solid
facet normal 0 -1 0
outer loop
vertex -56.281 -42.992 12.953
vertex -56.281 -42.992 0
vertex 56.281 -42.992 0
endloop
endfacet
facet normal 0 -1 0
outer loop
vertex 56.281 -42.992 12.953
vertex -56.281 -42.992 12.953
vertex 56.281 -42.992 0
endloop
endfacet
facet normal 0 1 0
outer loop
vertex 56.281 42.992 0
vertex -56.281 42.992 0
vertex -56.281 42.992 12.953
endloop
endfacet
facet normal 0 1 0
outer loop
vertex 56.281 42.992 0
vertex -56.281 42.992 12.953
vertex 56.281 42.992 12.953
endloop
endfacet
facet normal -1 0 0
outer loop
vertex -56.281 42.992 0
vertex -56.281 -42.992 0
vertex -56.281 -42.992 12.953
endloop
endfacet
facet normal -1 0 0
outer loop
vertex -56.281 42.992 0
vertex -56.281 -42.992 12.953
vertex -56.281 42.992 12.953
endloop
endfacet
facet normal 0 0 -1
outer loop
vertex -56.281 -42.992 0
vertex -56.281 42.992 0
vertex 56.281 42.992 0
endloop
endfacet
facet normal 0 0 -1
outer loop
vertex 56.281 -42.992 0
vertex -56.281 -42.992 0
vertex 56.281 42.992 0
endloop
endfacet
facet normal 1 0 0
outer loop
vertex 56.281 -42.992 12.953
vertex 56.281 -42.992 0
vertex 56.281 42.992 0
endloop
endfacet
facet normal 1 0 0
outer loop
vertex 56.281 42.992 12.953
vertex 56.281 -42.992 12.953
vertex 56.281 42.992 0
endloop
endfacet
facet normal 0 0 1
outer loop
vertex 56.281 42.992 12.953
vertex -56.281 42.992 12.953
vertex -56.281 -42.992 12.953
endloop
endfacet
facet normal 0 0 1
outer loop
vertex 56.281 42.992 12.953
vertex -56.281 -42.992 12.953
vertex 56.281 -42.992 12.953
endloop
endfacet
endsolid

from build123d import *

# Parameters (mm, degrees)
F0_W     = 112.5625893474
F0_H     = 85.9847515821
F1_DEPTH = 25
F2_R     = 5
F3_DEPTH = 10
F4_R     = 4.0842384209
F5_DEPTH = 8.1610530615
F2_W     = 112.5625893474
F2_H     = 85.9847515821
F6_DEPTH = 12.0471520349


with BuildPart() as f1:
    # F0 (on Top) → F1 (new body)
    with BuildSketch(Plane.XY):
        Rectangle(F0_W, F0_H)
    extrude(amount=F1_DEPTH)

    # F2 (on face) → F3 (cut)
    with BuildSketch(Plane.XY.offset(25)):
        with Locations((37.7486944199, -25.8610993624)):
            Circle(F2_R)
    extrude(amount=-F3_DEPTH, mode=Mode.SUBTRACT)

    # F4 (on face) → F5 (join)
    with BuildSketch(Plane.XY.offset(15)):
        with Locations((37.7486944199, -25.8610993624)):
            Circle(F4_R)
    extrude(amount=F5_DEPTH)

    # F2 (on face) → F6 (cut)
    with BuildSketch(Plane.XY.offset(25)):
        Rectangle(F2_W, F2_H)
        with Locations((37.7486944199, -25.8610993624)):
            Circle(F2_R, mode=Mode.SUBTRACT)
        with Locations((37.7486944199, -25.8610993624)):
            Circle(F2_R)
    extrude(amount=-F6_DEPTH, mode=Mode.SUBTRACT)


solid = f1.part
